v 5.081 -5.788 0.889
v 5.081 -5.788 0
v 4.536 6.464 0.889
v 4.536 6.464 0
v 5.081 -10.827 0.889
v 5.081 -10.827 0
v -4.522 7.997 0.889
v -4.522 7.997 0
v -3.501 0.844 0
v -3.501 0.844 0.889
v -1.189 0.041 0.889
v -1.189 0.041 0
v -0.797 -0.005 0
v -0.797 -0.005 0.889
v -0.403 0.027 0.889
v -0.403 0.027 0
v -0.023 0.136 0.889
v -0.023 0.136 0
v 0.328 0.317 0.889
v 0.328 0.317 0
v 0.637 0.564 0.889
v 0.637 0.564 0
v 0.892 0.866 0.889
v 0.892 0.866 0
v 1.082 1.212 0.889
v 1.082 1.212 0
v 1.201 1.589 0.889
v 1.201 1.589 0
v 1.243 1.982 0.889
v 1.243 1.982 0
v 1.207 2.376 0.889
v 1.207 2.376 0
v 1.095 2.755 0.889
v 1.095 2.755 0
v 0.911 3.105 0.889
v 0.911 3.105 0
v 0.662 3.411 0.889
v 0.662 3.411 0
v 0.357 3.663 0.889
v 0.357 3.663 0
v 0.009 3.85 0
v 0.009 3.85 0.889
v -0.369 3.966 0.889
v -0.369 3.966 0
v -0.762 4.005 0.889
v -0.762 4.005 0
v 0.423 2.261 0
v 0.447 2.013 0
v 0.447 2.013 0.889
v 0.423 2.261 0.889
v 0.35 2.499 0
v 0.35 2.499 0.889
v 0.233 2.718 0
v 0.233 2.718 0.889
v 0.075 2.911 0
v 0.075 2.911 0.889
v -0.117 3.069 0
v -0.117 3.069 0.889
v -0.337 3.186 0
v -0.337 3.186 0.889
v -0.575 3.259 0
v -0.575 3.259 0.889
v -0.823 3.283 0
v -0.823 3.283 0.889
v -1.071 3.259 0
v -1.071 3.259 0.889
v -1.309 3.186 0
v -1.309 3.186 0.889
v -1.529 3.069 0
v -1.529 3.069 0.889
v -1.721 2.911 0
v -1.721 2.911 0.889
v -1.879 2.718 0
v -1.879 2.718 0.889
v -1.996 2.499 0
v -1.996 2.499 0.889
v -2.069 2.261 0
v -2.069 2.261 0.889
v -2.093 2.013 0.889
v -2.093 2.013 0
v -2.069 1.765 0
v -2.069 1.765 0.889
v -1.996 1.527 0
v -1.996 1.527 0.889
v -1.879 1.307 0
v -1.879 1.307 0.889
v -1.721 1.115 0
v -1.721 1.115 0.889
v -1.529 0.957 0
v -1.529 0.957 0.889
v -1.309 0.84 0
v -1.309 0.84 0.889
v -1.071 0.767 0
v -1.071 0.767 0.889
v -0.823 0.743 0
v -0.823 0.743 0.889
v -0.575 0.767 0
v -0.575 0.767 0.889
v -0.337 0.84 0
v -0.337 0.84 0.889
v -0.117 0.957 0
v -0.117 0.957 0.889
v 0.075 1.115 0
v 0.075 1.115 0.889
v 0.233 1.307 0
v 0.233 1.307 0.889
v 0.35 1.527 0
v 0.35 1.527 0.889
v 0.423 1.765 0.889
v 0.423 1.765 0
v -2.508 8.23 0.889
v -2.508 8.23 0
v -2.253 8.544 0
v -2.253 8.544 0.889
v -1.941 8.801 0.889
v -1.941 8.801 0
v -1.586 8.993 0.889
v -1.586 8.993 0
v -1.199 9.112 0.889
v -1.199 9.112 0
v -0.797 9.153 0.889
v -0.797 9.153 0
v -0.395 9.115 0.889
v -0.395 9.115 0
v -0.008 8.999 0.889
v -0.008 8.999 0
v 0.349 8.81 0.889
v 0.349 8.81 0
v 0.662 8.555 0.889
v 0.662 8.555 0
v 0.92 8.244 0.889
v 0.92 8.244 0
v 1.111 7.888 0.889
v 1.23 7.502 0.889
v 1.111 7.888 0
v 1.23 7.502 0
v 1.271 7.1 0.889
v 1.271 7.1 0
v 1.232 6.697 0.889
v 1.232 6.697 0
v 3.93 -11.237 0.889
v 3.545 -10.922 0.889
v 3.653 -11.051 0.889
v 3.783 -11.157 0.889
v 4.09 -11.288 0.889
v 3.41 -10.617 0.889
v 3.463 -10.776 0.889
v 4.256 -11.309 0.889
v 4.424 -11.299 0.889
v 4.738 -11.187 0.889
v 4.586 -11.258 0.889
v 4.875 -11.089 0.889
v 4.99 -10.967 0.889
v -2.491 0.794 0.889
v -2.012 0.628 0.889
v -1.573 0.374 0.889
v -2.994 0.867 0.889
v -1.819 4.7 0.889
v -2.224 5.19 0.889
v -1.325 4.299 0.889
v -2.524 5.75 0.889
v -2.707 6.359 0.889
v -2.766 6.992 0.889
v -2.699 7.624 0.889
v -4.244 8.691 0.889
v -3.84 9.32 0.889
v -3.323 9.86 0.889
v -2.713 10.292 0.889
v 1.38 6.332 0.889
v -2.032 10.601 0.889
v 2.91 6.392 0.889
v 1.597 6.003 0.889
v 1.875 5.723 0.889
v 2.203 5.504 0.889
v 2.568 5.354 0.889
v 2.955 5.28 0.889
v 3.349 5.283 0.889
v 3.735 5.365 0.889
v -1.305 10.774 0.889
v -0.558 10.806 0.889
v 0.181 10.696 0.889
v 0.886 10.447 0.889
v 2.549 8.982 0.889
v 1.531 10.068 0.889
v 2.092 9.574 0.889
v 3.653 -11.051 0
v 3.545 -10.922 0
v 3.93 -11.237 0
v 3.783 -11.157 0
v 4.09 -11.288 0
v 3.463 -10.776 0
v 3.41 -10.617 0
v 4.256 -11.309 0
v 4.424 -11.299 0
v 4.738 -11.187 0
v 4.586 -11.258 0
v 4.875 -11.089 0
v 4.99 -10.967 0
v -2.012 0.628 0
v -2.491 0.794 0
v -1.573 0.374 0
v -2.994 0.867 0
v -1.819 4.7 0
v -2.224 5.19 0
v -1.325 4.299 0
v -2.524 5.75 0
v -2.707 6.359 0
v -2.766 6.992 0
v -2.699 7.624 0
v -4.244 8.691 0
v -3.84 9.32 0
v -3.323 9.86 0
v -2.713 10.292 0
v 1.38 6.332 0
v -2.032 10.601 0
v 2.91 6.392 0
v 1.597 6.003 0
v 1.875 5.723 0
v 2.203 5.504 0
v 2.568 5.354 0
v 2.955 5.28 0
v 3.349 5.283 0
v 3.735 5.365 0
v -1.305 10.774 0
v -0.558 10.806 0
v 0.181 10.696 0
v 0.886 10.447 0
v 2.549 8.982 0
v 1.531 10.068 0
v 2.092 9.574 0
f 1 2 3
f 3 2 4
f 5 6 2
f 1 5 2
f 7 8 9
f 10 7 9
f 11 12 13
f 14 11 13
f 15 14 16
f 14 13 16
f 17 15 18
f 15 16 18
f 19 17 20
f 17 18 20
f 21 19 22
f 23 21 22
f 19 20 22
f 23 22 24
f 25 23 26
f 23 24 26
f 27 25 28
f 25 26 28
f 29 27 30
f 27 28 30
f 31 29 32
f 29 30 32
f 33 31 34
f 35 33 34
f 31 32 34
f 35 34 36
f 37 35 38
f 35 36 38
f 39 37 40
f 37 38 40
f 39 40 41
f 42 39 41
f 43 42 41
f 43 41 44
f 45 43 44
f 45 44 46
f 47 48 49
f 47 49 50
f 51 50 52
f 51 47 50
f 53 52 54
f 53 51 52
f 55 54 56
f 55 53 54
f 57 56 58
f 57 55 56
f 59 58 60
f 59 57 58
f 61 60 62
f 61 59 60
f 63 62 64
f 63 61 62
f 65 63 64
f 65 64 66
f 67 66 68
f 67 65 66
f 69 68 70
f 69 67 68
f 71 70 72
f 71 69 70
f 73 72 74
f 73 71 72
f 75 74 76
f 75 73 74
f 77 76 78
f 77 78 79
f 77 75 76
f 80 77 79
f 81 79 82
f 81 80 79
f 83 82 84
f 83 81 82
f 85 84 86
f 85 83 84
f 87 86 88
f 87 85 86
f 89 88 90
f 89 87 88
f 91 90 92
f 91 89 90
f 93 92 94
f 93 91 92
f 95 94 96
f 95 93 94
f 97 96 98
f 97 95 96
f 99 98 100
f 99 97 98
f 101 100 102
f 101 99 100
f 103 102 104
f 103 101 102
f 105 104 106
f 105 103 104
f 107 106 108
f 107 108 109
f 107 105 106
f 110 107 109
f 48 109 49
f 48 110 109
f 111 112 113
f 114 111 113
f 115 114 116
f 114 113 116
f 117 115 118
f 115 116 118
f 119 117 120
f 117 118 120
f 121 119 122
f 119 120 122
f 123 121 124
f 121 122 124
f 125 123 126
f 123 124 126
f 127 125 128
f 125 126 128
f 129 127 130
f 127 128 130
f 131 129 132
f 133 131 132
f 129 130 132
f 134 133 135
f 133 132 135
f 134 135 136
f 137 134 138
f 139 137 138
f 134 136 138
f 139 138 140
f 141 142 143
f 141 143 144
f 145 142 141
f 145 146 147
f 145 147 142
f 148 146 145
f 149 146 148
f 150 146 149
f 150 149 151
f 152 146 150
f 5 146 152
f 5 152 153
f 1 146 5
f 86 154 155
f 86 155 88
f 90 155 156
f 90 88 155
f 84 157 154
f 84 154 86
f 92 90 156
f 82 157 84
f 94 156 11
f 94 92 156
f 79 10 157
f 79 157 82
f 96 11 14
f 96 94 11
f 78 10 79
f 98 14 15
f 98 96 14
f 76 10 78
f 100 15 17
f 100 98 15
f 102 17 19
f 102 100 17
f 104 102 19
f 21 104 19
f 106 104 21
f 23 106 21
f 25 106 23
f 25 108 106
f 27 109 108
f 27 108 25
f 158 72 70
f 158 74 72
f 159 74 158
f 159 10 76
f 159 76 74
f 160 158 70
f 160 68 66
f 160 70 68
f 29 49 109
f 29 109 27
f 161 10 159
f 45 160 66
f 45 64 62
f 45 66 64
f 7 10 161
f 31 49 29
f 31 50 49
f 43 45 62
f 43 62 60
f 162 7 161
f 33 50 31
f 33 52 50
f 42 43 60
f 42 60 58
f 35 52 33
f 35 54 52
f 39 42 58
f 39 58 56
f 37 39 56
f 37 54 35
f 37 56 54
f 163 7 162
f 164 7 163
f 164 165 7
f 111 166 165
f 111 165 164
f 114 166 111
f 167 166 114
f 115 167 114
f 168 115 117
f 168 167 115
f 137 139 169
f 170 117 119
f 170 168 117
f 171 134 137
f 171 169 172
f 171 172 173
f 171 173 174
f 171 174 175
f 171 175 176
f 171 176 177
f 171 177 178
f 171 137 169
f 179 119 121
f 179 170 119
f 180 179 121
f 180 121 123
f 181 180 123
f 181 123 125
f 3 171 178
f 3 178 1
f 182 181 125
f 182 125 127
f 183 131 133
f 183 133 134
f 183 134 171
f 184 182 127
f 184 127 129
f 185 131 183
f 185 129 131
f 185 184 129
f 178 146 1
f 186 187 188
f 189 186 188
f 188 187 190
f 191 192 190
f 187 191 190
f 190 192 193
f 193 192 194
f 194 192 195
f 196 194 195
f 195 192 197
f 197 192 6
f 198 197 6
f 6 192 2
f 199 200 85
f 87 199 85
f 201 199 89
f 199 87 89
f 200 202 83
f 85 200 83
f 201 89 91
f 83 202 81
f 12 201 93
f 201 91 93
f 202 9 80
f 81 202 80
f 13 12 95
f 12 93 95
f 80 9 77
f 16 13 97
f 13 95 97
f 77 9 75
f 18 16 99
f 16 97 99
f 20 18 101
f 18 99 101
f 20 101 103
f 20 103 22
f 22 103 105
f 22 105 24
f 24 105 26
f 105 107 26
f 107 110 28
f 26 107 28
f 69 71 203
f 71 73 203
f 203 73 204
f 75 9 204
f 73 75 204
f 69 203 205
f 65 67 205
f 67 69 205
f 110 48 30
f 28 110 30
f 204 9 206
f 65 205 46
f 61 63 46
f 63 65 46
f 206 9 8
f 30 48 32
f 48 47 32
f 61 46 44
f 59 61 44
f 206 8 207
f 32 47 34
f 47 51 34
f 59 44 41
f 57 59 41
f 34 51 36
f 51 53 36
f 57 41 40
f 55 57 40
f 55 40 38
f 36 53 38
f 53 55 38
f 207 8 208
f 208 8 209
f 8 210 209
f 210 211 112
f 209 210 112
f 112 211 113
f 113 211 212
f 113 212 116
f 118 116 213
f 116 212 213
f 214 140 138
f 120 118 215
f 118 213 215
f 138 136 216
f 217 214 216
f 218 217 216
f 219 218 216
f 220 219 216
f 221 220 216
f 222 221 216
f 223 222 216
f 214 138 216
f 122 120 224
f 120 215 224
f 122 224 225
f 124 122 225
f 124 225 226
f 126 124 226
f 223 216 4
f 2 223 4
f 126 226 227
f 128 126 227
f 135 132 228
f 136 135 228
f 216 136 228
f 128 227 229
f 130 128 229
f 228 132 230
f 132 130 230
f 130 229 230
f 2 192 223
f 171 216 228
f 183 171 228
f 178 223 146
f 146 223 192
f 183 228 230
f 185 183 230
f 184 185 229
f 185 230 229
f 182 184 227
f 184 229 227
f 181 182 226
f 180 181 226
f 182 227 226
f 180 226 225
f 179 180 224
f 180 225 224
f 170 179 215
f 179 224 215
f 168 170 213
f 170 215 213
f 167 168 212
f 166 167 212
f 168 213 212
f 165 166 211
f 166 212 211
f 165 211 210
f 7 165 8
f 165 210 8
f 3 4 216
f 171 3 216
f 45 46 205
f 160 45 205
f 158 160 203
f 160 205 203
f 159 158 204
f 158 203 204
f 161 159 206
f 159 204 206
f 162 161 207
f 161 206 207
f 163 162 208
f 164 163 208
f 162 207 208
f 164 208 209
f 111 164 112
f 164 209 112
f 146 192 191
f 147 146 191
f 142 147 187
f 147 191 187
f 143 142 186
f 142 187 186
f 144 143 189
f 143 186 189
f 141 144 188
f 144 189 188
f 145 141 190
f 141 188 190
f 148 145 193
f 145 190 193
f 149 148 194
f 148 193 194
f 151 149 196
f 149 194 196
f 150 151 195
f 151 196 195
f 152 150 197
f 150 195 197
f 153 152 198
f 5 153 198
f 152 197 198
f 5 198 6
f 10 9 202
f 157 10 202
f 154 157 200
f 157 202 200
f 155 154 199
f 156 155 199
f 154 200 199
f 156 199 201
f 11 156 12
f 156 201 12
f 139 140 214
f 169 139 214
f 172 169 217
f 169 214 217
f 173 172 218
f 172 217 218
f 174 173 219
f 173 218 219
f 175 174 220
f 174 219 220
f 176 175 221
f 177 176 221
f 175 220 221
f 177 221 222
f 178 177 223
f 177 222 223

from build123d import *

# Parameters (mm, degrees)
SKETCH1_R           = 1.27
BOSS_EXTRUDE1_DEPTH = 0.889


with BuildPart() as part:
    # Sketch1 → Boss-Extrude1 (new body)
    with BuildSketch(Plane.XY):
        with BuildLine():
            Line((-4.521957117, 7.997023921), (-3.500640843, 0.843746079))
            ThreePointArc((-3.500640843, 0.843746079), (-2.247752793, 0.722417864), (-1.189432305, 0.040943912))
            ThreePointArc((-1.189432305, 0.040943912), (1.231506645, 1.78476828), (-0.761885285, 4.004736172))
            ThreePointArc((-0.761885285, 4.004736172), (-2.523808067, 5.75027928), (-2.507561872, 8.230406029))
            ThreePointArc((-2.507561872, 8.230406029), (-0.008086329, 8.999486055), (1.23243455, 6.697319679))
            ThreePointArc((1.23243455, 6.697319679), (2.203084663, 5.504138097), (3.734868812, 5.364562852))
            Line((3.734868812, 5.364562852), (3.409647754, -10.616831622))
            ThreePointArc((3.409647754, -10.616831622), (4.172569321, -11.302719528), (5.081281403, -10.826553706))
            Line((5.081281403, -10.826553706), (5.081281403, -5.788347659))
            Line((5.081281403, -5.788347659), (4.536062194, 6.463867416))
            Line((4.536062194, 6.463867416), (2.910345816, 6.391523616))
            Line((2.910345816, 6.391523616), (2.548786355, 8.982410145))
            ThreePointArc((2.548786355, 8.982410145), (-1.304965957, 10.774290658), (-4.521957117, 7.997023921))
        make_face()
        with Locations((-0.822961988, 2.012924292)):
            Circle(SKETCH1_R, mode=Mode.SUBTRACT)
    extrude(amount=BOSS_EXTRUDE1_DEPTH)


solid = part.part
